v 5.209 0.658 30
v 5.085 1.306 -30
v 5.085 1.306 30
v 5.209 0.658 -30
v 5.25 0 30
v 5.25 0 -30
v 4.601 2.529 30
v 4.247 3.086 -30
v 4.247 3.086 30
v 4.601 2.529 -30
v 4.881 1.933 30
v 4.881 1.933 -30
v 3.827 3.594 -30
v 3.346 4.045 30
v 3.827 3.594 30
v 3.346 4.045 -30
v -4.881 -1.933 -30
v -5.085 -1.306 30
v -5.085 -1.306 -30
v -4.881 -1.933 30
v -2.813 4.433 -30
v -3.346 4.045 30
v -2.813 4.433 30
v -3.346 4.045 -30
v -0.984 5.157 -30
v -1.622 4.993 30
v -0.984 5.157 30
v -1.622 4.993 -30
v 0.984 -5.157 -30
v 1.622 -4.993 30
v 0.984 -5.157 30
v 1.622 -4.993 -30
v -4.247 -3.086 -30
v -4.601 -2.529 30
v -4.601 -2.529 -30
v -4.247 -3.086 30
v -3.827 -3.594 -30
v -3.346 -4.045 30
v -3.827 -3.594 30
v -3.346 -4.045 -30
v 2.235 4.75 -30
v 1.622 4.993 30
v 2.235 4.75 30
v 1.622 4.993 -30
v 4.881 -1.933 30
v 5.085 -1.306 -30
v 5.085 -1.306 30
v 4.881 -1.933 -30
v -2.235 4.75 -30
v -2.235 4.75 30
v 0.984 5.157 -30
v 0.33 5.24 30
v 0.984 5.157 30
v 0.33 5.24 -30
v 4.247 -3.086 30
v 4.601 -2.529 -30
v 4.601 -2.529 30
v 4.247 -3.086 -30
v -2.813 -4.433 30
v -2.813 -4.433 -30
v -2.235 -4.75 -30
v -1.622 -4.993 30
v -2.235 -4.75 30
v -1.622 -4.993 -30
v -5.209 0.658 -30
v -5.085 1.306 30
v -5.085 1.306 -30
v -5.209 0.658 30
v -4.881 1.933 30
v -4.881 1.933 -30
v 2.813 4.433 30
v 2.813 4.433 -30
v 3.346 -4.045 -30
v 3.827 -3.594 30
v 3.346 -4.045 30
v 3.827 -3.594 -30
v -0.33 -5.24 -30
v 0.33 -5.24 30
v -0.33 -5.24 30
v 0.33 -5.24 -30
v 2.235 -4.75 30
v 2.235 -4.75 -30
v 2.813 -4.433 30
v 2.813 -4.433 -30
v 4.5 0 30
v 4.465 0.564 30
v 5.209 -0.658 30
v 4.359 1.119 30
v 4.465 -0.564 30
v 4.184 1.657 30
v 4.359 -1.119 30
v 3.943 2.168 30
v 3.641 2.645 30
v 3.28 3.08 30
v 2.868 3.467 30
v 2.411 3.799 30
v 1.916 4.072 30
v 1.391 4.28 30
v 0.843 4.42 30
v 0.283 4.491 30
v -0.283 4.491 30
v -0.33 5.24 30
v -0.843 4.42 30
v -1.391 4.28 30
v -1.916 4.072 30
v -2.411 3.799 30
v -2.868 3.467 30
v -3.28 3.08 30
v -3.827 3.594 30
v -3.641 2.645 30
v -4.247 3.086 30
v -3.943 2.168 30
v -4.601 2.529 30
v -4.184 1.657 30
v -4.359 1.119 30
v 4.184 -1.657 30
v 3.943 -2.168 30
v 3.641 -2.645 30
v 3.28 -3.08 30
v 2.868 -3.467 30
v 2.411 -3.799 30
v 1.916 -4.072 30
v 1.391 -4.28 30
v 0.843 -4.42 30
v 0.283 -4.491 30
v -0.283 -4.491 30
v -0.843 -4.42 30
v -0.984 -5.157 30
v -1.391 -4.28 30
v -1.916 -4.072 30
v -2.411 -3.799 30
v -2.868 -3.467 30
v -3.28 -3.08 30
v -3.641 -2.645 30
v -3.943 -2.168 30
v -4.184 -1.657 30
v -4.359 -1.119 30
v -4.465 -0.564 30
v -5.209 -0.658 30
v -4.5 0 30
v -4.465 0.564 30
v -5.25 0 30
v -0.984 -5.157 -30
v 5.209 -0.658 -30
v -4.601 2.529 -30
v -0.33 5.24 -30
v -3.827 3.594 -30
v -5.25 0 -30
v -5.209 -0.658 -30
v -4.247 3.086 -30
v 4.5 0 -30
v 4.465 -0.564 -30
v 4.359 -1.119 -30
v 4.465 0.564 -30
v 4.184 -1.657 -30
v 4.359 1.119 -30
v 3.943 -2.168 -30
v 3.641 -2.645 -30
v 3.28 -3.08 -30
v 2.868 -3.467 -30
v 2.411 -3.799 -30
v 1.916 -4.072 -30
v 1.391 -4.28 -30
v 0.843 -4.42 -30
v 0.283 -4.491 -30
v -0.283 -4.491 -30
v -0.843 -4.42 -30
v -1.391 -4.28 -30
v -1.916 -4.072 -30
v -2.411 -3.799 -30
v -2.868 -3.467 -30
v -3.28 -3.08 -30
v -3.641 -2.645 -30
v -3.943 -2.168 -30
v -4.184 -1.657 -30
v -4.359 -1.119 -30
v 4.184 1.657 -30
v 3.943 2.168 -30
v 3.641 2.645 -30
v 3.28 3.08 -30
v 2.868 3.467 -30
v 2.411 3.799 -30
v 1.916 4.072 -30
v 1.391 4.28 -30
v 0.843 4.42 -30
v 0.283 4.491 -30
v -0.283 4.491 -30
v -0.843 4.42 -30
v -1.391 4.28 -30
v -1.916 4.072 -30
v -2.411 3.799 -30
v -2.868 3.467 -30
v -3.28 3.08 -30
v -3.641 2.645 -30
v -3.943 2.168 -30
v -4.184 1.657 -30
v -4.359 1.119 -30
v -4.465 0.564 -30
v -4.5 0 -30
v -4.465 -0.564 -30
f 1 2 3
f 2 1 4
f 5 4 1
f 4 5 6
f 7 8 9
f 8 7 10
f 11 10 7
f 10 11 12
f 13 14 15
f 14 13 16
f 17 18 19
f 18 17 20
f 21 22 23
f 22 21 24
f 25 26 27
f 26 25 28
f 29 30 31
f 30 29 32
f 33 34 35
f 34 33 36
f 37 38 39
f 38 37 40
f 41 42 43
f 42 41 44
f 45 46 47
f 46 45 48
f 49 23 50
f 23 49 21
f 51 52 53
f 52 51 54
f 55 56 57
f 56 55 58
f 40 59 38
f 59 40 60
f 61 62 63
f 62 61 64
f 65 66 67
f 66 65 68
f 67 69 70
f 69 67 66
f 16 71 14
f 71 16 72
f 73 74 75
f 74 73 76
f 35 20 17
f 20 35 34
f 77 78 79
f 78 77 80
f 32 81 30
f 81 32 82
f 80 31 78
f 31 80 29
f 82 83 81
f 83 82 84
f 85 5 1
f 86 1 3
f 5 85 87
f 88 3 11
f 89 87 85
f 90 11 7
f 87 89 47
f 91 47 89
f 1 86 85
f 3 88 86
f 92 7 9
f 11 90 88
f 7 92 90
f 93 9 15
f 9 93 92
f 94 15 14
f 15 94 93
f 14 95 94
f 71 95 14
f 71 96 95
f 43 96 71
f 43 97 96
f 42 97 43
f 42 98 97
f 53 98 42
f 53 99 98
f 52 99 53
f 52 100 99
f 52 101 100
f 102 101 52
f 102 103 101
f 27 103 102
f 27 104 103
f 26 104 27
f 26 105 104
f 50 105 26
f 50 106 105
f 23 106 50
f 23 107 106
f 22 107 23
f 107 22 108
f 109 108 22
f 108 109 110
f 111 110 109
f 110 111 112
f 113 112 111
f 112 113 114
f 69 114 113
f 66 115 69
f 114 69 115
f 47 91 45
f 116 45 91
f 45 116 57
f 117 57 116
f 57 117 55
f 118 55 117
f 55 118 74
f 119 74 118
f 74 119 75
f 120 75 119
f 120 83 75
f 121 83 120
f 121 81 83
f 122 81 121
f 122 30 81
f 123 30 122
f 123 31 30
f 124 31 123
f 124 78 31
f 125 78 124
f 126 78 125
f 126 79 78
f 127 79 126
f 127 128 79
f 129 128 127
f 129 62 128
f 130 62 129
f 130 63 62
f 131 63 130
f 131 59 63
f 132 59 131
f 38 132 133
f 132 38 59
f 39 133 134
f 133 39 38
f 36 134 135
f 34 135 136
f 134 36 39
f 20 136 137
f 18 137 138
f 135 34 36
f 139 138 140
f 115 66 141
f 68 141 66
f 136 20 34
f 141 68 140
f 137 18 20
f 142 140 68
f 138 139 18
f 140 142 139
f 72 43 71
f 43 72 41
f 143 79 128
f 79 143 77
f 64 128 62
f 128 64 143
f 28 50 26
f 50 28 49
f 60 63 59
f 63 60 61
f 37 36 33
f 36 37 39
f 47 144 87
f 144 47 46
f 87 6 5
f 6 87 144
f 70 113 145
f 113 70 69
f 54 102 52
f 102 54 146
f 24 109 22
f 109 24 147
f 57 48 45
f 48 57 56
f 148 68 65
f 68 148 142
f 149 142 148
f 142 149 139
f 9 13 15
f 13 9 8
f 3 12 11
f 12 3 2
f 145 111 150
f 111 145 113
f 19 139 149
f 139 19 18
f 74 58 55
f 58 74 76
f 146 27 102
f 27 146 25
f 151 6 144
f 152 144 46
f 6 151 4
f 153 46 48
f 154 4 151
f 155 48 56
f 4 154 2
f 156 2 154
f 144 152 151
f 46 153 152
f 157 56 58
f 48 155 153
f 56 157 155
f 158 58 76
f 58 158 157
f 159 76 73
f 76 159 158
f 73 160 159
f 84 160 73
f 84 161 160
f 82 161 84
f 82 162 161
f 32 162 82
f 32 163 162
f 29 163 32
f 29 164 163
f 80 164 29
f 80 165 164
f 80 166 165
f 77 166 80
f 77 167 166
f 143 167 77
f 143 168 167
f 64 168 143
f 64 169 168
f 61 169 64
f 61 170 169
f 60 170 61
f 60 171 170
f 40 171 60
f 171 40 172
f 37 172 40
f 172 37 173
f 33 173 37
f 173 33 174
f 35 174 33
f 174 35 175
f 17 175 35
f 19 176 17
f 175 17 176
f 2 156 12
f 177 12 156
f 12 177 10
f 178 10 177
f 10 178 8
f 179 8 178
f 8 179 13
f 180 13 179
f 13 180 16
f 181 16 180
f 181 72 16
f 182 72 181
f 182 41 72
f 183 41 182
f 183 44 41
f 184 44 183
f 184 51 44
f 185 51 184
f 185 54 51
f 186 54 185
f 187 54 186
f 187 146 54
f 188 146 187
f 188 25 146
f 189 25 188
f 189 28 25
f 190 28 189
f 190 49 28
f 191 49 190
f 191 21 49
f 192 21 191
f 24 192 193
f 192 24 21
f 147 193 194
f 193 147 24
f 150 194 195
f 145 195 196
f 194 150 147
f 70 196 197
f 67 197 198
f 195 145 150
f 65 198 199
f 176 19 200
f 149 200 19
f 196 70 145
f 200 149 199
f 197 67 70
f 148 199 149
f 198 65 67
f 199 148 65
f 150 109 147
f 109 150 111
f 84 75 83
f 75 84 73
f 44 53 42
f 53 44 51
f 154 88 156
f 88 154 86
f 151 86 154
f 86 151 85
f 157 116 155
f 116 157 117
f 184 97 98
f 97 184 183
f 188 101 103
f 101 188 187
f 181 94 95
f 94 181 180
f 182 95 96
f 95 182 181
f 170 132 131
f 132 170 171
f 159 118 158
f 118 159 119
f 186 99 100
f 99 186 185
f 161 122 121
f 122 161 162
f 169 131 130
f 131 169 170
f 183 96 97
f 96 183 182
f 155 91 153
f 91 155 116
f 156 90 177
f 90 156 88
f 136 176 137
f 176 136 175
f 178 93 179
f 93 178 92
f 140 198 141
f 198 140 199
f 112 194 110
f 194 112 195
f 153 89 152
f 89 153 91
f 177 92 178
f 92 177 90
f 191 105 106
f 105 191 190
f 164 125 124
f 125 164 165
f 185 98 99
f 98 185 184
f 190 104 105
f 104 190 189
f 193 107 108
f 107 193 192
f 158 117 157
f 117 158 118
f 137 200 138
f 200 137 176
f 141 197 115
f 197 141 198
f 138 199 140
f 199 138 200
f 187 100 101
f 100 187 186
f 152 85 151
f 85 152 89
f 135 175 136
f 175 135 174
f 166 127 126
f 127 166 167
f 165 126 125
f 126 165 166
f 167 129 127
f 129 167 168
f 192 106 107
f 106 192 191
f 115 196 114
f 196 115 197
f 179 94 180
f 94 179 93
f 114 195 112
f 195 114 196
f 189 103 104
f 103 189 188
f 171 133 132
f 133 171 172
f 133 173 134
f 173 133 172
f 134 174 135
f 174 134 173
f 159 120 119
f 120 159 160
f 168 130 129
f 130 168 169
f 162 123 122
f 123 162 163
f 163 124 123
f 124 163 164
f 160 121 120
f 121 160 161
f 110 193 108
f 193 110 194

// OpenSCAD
$fn = 50;


difference() {
	union() {
		translate(v = [0, 0, -30.0000000000]) {
			cylinder(h = 60, r = 5.2500000000);
		}
	}
	union() {
		translate(v = [0, 0, -100.0000000000]) {
			cylinder(h = 200, r = 4.5000000000);
		}
	}
}
